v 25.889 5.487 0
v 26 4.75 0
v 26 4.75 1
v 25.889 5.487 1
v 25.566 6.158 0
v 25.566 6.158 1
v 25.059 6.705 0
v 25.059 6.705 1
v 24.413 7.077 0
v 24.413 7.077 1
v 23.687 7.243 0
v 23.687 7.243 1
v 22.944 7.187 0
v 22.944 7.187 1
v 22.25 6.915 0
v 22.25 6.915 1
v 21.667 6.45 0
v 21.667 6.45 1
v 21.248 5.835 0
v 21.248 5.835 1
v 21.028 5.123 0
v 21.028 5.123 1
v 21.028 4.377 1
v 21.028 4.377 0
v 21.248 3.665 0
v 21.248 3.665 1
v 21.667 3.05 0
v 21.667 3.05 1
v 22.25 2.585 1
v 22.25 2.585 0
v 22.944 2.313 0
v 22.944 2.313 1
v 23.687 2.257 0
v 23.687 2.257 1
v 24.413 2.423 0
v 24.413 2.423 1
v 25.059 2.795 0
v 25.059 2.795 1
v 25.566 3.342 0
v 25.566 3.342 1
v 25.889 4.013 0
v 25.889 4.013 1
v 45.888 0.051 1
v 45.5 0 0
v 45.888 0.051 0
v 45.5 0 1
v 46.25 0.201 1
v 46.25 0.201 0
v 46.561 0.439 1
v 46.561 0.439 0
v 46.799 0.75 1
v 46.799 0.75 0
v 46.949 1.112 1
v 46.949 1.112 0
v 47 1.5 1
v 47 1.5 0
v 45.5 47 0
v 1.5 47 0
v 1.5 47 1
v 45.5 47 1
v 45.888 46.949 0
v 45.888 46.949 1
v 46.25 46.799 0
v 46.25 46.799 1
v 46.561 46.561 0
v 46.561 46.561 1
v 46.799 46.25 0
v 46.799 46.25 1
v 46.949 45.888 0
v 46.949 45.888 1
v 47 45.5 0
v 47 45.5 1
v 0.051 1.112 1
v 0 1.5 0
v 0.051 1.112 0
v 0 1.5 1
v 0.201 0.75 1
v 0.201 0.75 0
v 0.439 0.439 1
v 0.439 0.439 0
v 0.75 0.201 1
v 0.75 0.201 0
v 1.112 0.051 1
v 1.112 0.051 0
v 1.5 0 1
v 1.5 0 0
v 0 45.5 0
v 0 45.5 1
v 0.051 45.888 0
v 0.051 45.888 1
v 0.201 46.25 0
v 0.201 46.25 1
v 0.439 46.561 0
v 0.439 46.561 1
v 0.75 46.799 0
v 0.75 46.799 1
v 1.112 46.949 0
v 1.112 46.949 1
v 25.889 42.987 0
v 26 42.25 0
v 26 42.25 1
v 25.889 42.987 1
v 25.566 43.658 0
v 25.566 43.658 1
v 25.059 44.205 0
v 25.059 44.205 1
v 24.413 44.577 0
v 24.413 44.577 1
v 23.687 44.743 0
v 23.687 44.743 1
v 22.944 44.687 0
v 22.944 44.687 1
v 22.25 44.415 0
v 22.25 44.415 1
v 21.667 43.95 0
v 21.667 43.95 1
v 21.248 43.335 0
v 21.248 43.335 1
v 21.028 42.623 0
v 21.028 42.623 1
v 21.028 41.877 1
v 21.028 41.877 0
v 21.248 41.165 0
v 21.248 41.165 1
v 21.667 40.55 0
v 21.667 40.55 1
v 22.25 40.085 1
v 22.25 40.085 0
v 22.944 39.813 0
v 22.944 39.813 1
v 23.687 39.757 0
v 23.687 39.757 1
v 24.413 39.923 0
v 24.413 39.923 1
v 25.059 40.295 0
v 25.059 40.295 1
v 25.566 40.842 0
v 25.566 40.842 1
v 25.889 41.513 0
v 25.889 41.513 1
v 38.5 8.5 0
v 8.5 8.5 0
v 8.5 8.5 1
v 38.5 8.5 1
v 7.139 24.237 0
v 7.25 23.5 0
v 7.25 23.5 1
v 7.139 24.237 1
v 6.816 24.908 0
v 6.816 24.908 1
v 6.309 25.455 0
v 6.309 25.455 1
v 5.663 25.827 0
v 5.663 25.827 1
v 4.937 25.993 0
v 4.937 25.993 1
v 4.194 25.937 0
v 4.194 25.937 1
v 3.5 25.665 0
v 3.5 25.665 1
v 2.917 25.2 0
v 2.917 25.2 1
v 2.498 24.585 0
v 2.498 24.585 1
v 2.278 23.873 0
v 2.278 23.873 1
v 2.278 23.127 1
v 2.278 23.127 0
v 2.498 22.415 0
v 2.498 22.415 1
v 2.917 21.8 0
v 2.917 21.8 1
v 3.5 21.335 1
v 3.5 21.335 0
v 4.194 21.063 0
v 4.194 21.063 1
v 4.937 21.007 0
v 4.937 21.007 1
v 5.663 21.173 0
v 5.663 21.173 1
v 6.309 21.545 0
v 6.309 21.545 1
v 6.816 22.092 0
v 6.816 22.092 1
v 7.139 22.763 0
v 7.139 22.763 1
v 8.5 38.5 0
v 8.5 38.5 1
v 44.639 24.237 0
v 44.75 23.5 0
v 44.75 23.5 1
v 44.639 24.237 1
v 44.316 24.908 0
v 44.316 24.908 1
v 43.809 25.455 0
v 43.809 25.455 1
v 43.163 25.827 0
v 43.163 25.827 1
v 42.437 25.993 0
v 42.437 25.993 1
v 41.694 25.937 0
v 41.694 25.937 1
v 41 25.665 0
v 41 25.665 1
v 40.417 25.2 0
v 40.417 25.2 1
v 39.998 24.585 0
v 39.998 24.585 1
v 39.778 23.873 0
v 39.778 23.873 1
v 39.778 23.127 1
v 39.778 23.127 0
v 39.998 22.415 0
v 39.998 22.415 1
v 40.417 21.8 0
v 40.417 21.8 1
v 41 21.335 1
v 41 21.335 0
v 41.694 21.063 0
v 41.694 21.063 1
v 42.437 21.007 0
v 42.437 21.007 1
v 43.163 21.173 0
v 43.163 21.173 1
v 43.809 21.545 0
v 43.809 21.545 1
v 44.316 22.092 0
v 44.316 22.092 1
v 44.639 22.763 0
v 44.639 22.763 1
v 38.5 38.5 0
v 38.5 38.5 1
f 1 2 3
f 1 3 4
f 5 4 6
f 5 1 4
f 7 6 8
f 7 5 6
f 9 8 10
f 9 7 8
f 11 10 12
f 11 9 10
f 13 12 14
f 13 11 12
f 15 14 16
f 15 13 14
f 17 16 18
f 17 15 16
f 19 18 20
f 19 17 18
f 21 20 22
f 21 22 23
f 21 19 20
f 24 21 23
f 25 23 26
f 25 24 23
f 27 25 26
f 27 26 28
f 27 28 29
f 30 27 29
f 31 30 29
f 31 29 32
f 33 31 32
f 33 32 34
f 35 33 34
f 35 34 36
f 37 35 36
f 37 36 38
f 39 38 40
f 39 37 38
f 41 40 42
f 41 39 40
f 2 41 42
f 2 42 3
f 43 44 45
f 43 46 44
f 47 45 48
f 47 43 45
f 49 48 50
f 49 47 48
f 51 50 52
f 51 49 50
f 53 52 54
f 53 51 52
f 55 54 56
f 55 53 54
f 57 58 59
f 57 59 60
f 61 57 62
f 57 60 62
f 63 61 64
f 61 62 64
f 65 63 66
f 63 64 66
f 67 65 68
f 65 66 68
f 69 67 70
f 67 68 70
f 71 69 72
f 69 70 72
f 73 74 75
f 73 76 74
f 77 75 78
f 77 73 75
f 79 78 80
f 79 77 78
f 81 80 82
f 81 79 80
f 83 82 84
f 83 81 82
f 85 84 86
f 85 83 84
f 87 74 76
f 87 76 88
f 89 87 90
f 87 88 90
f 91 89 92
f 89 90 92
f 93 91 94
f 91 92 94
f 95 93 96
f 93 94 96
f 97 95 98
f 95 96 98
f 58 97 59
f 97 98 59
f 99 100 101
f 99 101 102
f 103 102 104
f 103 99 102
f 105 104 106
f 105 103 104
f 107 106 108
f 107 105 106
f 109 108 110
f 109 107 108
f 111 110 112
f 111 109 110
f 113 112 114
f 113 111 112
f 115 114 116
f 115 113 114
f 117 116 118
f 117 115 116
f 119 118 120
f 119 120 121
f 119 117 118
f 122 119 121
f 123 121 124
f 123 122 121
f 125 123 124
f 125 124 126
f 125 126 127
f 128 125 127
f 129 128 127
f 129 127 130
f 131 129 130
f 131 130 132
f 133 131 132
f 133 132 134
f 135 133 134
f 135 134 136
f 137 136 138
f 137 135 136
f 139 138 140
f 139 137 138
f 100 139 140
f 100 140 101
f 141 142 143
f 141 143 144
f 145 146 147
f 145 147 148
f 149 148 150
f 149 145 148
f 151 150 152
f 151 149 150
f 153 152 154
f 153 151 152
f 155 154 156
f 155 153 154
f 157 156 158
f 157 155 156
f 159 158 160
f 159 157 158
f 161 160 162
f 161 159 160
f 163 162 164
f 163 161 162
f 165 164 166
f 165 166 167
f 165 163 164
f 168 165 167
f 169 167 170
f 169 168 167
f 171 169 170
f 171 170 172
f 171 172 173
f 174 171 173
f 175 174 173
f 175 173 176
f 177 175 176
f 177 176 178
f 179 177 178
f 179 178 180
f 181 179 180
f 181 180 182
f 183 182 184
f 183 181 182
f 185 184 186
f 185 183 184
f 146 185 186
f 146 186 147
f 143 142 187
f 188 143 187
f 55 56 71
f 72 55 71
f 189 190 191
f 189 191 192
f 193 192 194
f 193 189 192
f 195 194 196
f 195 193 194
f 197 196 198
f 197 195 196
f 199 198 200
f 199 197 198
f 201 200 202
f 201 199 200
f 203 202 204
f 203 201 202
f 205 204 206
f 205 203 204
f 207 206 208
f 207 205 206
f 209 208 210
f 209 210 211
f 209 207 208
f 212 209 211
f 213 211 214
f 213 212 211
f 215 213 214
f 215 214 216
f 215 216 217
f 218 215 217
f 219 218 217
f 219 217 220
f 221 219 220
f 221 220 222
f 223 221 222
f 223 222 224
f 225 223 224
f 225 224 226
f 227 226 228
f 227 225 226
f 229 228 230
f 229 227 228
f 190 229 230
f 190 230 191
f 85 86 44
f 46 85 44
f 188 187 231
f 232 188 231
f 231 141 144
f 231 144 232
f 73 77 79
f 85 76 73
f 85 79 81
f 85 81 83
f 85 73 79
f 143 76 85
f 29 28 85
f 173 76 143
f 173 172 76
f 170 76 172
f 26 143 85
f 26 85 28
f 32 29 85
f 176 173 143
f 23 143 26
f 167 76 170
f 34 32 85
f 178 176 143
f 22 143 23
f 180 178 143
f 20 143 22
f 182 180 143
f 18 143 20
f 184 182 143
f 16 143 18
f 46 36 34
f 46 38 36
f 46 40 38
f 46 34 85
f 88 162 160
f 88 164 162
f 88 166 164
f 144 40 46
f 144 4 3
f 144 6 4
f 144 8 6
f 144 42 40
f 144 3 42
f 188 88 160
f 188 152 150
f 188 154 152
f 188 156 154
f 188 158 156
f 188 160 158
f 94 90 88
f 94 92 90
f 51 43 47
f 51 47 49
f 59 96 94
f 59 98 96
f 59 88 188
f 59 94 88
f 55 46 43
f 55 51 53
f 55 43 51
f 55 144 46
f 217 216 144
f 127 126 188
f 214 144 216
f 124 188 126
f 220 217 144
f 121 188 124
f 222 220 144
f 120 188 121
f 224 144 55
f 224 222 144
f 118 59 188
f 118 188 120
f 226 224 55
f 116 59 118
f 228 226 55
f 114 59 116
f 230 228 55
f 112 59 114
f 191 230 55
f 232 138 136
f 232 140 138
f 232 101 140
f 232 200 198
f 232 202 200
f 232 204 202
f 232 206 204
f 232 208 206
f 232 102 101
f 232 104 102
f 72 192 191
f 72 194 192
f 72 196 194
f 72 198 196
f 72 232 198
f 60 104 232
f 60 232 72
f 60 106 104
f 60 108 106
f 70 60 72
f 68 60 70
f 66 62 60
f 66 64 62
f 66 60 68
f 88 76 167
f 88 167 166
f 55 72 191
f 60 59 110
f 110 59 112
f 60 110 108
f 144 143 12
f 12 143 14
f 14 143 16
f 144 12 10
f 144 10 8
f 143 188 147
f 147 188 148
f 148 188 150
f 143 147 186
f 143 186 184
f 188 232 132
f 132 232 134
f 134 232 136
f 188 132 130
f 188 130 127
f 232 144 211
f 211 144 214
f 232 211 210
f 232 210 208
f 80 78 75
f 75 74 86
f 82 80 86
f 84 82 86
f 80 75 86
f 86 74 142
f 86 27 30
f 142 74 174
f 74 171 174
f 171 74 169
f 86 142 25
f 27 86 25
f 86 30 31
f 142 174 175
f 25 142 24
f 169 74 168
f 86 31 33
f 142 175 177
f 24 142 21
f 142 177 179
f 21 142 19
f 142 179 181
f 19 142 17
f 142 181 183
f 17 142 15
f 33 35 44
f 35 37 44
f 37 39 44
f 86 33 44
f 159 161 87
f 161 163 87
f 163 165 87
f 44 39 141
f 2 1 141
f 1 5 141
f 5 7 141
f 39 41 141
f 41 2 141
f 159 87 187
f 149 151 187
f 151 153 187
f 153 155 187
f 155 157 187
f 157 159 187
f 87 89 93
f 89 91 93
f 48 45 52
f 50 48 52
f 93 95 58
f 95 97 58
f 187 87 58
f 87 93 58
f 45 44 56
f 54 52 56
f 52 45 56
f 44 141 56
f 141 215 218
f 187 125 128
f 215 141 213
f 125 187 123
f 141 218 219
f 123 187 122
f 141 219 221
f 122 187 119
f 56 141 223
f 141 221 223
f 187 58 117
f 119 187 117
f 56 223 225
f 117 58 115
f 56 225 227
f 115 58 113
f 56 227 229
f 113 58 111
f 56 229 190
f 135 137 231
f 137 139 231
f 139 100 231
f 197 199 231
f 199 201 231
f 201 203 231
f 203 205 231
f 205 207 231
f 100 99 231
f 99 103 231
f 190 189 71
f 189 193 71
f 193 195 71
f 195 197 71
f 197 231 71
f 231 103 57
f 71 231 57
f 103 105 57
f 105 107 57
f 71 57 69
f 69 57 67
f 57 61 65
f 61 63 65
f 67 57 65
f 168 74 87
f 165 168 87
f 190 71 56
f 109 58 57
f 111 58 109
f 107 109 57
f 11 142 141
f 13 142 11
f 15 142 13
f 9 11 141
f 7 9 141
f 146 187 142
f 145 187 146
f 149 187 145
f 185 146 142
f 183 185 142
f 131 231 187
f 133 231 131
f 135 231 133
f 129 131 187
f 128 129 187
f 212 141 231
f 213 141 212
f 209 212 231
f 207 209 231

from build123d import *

# Parameters (mm, degrees)
SKETCH1_W           = 47
SKETCH1_H           = 47
SKETCH1_R           = 2.5
SKETCH1_W_2         = 30
SKETCH1_H_2         = 30
BOSS_EXTRUDE1_DEPTH = 1
FILLET1_R           = 1.5


with BuildPart() as part:
    # Sketch1 → Boss-Extrude1 (new body)
    with BuildSketch(Plane.XY):
        with Locations((23.5, 23.5)):
            Rectangle(SKETCH1_W, SKETCH1_H)
        with Locations((23.5, 4.75)):
            Circle(SKETCH1_R, mode=Mode.SUBTRACT)
        with Locations((42.25, 23.5)):
            Circle(SKETCH1_R, mode=Mode.SUBTRACT)
        with Locations((23.5, 42.25)):
            Circle(SKETCH1_R, mode=Mode.SUBTRACT)
        with Locations((4.75, 23.5)):
            Circle(SKETCH1_R, mode=Mode.SUBTRACT)
        with Locations((23.5, 23.5)):
            Rectangle(SKETCH1_W_2, SKETCH1_H_2, mode=Mode.SUBTRACT)
    extrude(amount=BOSS_EXTRUDE1_DEPTH)

    # Fillet1
    fillet1_edges = [part.edges().sort_by_distance(p)[0] for p in [
        (0, 47, 0.5),
        (47, 47, 0.5),
        (47, 0, 0.5),
        (0, 0, 0.5),
    ]]
    fillet(fillet1_edges, radius=FILLET1_R)


solid = part.part
